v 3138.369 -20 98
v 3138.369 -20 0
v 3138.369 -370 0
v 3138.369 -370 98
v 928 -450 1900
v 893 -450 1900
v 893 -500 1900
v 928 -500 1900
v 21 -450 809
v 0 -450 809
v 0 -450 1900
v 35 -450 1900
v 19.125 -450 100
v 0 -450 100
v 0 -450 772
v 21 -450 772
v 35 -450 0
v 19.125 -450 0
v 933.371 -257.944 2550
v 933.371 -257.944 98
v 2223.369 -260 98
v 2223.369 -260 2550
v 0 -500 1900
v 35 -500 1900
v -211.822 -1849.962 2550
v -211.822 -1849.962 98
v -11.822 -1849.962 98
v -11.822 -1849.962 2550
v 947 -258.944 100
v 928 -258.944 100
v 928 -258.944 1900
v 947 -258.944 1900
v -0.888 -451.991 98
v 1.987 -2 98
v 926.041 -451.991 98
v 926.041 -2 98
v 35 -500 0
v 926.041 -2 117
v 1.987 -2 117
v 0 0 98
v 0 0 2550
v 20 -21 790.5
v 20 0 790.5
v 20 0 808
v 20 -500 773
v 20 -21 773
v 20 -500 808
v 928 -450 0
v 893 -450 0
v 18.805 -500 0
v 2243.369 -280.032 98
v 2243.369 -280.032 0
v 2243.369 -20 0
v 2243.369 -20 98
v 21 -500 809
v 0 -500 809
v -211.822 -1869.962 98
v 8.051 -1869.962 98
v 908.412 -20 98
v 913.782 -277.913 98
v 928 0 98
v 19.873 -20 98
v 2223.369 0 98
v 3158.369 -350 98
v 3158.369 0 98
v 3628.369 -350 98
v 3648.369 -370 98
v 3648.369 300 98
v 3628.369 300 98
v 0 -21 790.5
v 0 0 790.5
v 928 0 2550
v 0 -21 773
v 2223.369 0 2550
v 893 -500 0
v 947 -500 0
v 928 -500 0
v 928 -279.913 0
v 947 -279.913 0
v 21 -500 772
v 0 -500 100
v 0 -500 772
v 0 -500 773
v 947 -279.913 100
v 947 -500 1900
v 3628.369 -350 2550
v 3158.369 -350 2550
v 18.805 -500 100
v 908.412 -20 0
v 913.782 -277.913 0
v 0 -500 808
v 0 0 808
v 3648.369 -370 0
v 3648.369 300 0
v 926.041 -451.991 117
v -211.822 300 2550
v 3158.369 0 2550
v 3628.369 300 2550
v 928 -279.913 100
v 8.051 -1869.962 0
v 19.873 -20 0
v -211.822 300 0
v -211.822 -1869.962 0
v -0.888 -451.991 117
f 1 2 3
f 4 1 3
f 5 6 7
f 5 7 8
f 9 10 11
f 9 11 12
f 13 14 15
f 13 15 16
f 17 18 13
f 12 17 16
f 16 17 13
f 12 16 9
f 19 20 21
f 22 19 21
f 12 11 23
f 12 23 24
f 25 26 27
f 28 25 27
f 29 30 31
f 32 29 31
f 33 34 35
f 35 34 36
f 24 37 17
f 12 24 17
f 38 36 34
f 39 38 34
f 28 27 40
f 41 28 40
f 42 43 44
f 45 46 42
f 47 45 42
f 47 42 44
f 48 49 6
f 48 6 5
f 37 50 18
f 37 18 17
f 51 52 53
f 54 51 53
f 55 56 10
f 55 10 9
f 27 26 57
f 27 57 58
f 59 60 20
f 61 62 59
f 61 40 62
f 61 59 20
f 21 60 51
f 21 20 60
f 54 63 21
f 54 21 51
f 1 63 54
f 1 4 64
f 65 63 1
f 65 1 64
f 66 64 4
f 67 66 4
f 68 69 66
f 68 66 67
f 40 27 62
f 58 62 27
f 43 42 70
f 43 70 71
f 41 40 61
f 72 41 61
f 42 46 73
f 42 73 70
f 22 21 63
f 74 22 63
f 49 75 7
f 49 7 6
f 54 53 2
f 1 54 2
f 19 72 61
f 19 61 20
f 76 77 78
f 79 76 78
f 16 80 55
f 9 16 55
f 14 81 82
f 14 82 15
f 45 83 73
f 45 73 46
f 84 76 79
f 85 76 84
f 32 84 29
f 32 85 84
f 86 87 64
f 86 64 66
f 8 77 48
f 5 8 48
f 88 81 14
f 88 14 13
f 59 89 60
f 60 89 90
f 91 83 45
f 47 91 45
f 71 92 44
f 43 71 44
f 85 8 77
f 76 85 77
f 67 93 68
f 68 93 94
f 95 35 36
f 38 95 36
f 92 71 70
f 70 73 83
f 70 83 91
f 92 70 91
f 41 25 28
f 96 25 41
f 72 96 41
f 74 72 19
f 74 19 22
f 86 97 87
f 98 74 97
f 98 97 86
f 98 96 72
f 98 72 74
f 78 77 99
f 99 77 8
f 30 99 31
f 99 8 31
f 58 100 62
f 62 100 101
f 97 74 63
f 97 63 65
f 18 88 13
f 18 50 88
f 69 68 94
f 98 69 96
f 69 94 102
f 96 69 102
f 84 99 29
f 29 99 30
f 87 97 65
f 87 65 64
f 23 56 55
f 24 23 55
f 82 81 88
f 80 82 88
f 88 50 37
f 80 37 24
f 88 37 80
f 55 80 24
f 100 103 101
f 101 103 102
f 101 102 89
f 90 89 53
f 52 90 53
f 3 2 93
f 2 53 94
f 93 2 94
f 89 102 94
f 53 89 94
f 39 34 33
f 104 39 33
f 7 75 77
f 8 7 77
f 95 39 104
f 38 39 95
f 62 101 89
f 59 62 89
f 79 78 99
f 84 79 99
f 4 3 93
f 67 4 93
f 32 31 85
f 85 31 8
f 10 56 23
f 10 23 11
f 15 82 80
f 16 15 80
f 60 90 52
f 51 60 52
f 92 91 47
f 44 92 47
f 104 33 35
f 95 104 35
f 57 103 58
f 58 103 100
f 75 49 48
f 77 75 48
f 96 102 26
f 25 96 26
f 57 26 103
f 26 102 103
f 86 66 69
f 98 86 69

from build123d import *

# Parameters (mm, degrees)
F1_DEPTH   = 2550
F2_DEPTH   = 98
F3_W       = 35
F3_H       = 50
F4_DEPTH   = 1900
F5_OFFSET  = 2
F6_W       = 35
F6_H       = 50
F7_DEPTH   = 1900
F10_DEPTH  = 19
F11_W      = 20
F11_H      = 35
F12_DEPTH  = 500
F13_OFFSET = 1
F14_W      = 21
F14_H      = 17.5
F15_DEPTH  = 20
F17_DEPTH  = 19


# Not quite as in the source:
# - a feature names something its author has since deleted; it is built from what else it names


with BuildPart() as f1:
    # F0 (on Top) → F1 (new body)
    with BuildSketch(Plane.XY):
        Polygon((-211.8216594828, -1849.9622289028), (-11.8216594828, -1849.9622289028), (0, 0), (928, 0), (933.3707714659, -257.944092419), (2223.3691331874, -260), (2223.3691331874, 0), (3158.3691331874, 0), (3158.3691331874, -350), (3628.3691331874, -350), (3628.3691331874, 300), (-211.8216594828, 300), align=None)
    extrude(amount=F1_DEPTH)

    # F0 (on Top) → F2 (join)
    with BuildSketch(Plane.XY):
        Polygon((0, 0), (-11.8216594828, -1849.9622289028), (-211.8216594828, -1849.9622289028), (-211.8216594828, -1869.9622289028), (8.0509445283, -1869.9622289028), (19.872604011, -20), (908.4120942515, -20), (913.7822162245, -277.9128989735), (2243.3691331874, -280.0318999763), (2243.3691331874, -20), (3138.3691331874, -20), (3138.3691331874, -370), (3648.3691331874, -370), (3648.3691331874, 300), (3628.3691331874, 300), (3628.3691331874, -350), (3158.3691331874, -350), (3158.3691331874, 0), (2223.3691331874, 0), (2223.3691331874, -260), (933.3707714659, -257.944092419), (928, 0), align=None)
    extrude(amount=F2_DEPTH)


with BuildPart() as f4:
    # F3 (on Top) → F4 (new body)
    with BuildSketch(Plane.XY):
        with Locations((17.5, -475)):
            Rectangle(F3_W, F3_H)
    extrude(amount=F4_DEPTH)

    # F5: cut F1, made larger all round first
    f5_tool = offset(f1.part, amount=F5_OFFSET, kind=Kind.INTERSECTION, mode=Mode.PRIVATE)
    add(f5_tool, mode=Mode.SUBTRACT)


with BuildPart() as f7:
    # F6 (on Top) → F7 (new body, through all)
    with BuildSketch(Plane.XY):
        with Locations((910.5, -475)):
            Rectangle(F6_W, F6_H)
    extrude(amount=F7_DEPTH)


with BuildPart() as f10:
    # F9 (on face) → F10 (new body)
    with BuildSketch(Plane.XY.offset(98)):
        Polygon((1.9872604011, -2), (-0.888278392, -451.9908124358), (926.0412094252, -451.9908124358), (926.0412094252, -2), align=None)
    extrude(amount=F10_DEPTH)


with BuildPart() as f12:
    # F11 (on face) → F12 (new body, through all)
    with BuildSketch(Plane.XZ.offset(500)):
        with Locations((10, 790.5)):
            Rectangle(F11_W, F11_H)
    extrude(amount=-F12_DEPTH)


with BuildPart() as f4_1:
    add(f4.part)

    # F13: cut F12, made larger all round first
    f13_tool = offset(f12.part, amount=F13_OFFSET, kind=Kind.INTERSECTION, mode=Mode.PRIVATE)
    add(f13_tool, mode=Mode.SUBTRACT)


with BuildPart() as f12_1:
    add(f12.part)

    # F14 (on face) → F15 (cut, through all)
    with BuildSketch(Plane.YZ.offset(20)):
        with Locations((-10.5, 781.75)):
            Rectangle(F14_W, F14_H)
    extrude(amount=-F15_DEPTH, mode=Mode.SUBTRACT)


with BuildPart() as f17:
    # F16 (on face) → F17 (new body)
    with BuildSketch(Plane.YZ.offset(928)):
        Polygon((-500, 1900), (-500, 0), (-279.9128989735, 0), (-279.9128989735, 100), (-258.944092419, 100), (-258.944092419, 1900), align=None)
    extrude(amount=F17_DEPTH)


solid = Compound([f1.part, f7.part, f10.part, f4_1.part, f12_1.part, f17.part])
